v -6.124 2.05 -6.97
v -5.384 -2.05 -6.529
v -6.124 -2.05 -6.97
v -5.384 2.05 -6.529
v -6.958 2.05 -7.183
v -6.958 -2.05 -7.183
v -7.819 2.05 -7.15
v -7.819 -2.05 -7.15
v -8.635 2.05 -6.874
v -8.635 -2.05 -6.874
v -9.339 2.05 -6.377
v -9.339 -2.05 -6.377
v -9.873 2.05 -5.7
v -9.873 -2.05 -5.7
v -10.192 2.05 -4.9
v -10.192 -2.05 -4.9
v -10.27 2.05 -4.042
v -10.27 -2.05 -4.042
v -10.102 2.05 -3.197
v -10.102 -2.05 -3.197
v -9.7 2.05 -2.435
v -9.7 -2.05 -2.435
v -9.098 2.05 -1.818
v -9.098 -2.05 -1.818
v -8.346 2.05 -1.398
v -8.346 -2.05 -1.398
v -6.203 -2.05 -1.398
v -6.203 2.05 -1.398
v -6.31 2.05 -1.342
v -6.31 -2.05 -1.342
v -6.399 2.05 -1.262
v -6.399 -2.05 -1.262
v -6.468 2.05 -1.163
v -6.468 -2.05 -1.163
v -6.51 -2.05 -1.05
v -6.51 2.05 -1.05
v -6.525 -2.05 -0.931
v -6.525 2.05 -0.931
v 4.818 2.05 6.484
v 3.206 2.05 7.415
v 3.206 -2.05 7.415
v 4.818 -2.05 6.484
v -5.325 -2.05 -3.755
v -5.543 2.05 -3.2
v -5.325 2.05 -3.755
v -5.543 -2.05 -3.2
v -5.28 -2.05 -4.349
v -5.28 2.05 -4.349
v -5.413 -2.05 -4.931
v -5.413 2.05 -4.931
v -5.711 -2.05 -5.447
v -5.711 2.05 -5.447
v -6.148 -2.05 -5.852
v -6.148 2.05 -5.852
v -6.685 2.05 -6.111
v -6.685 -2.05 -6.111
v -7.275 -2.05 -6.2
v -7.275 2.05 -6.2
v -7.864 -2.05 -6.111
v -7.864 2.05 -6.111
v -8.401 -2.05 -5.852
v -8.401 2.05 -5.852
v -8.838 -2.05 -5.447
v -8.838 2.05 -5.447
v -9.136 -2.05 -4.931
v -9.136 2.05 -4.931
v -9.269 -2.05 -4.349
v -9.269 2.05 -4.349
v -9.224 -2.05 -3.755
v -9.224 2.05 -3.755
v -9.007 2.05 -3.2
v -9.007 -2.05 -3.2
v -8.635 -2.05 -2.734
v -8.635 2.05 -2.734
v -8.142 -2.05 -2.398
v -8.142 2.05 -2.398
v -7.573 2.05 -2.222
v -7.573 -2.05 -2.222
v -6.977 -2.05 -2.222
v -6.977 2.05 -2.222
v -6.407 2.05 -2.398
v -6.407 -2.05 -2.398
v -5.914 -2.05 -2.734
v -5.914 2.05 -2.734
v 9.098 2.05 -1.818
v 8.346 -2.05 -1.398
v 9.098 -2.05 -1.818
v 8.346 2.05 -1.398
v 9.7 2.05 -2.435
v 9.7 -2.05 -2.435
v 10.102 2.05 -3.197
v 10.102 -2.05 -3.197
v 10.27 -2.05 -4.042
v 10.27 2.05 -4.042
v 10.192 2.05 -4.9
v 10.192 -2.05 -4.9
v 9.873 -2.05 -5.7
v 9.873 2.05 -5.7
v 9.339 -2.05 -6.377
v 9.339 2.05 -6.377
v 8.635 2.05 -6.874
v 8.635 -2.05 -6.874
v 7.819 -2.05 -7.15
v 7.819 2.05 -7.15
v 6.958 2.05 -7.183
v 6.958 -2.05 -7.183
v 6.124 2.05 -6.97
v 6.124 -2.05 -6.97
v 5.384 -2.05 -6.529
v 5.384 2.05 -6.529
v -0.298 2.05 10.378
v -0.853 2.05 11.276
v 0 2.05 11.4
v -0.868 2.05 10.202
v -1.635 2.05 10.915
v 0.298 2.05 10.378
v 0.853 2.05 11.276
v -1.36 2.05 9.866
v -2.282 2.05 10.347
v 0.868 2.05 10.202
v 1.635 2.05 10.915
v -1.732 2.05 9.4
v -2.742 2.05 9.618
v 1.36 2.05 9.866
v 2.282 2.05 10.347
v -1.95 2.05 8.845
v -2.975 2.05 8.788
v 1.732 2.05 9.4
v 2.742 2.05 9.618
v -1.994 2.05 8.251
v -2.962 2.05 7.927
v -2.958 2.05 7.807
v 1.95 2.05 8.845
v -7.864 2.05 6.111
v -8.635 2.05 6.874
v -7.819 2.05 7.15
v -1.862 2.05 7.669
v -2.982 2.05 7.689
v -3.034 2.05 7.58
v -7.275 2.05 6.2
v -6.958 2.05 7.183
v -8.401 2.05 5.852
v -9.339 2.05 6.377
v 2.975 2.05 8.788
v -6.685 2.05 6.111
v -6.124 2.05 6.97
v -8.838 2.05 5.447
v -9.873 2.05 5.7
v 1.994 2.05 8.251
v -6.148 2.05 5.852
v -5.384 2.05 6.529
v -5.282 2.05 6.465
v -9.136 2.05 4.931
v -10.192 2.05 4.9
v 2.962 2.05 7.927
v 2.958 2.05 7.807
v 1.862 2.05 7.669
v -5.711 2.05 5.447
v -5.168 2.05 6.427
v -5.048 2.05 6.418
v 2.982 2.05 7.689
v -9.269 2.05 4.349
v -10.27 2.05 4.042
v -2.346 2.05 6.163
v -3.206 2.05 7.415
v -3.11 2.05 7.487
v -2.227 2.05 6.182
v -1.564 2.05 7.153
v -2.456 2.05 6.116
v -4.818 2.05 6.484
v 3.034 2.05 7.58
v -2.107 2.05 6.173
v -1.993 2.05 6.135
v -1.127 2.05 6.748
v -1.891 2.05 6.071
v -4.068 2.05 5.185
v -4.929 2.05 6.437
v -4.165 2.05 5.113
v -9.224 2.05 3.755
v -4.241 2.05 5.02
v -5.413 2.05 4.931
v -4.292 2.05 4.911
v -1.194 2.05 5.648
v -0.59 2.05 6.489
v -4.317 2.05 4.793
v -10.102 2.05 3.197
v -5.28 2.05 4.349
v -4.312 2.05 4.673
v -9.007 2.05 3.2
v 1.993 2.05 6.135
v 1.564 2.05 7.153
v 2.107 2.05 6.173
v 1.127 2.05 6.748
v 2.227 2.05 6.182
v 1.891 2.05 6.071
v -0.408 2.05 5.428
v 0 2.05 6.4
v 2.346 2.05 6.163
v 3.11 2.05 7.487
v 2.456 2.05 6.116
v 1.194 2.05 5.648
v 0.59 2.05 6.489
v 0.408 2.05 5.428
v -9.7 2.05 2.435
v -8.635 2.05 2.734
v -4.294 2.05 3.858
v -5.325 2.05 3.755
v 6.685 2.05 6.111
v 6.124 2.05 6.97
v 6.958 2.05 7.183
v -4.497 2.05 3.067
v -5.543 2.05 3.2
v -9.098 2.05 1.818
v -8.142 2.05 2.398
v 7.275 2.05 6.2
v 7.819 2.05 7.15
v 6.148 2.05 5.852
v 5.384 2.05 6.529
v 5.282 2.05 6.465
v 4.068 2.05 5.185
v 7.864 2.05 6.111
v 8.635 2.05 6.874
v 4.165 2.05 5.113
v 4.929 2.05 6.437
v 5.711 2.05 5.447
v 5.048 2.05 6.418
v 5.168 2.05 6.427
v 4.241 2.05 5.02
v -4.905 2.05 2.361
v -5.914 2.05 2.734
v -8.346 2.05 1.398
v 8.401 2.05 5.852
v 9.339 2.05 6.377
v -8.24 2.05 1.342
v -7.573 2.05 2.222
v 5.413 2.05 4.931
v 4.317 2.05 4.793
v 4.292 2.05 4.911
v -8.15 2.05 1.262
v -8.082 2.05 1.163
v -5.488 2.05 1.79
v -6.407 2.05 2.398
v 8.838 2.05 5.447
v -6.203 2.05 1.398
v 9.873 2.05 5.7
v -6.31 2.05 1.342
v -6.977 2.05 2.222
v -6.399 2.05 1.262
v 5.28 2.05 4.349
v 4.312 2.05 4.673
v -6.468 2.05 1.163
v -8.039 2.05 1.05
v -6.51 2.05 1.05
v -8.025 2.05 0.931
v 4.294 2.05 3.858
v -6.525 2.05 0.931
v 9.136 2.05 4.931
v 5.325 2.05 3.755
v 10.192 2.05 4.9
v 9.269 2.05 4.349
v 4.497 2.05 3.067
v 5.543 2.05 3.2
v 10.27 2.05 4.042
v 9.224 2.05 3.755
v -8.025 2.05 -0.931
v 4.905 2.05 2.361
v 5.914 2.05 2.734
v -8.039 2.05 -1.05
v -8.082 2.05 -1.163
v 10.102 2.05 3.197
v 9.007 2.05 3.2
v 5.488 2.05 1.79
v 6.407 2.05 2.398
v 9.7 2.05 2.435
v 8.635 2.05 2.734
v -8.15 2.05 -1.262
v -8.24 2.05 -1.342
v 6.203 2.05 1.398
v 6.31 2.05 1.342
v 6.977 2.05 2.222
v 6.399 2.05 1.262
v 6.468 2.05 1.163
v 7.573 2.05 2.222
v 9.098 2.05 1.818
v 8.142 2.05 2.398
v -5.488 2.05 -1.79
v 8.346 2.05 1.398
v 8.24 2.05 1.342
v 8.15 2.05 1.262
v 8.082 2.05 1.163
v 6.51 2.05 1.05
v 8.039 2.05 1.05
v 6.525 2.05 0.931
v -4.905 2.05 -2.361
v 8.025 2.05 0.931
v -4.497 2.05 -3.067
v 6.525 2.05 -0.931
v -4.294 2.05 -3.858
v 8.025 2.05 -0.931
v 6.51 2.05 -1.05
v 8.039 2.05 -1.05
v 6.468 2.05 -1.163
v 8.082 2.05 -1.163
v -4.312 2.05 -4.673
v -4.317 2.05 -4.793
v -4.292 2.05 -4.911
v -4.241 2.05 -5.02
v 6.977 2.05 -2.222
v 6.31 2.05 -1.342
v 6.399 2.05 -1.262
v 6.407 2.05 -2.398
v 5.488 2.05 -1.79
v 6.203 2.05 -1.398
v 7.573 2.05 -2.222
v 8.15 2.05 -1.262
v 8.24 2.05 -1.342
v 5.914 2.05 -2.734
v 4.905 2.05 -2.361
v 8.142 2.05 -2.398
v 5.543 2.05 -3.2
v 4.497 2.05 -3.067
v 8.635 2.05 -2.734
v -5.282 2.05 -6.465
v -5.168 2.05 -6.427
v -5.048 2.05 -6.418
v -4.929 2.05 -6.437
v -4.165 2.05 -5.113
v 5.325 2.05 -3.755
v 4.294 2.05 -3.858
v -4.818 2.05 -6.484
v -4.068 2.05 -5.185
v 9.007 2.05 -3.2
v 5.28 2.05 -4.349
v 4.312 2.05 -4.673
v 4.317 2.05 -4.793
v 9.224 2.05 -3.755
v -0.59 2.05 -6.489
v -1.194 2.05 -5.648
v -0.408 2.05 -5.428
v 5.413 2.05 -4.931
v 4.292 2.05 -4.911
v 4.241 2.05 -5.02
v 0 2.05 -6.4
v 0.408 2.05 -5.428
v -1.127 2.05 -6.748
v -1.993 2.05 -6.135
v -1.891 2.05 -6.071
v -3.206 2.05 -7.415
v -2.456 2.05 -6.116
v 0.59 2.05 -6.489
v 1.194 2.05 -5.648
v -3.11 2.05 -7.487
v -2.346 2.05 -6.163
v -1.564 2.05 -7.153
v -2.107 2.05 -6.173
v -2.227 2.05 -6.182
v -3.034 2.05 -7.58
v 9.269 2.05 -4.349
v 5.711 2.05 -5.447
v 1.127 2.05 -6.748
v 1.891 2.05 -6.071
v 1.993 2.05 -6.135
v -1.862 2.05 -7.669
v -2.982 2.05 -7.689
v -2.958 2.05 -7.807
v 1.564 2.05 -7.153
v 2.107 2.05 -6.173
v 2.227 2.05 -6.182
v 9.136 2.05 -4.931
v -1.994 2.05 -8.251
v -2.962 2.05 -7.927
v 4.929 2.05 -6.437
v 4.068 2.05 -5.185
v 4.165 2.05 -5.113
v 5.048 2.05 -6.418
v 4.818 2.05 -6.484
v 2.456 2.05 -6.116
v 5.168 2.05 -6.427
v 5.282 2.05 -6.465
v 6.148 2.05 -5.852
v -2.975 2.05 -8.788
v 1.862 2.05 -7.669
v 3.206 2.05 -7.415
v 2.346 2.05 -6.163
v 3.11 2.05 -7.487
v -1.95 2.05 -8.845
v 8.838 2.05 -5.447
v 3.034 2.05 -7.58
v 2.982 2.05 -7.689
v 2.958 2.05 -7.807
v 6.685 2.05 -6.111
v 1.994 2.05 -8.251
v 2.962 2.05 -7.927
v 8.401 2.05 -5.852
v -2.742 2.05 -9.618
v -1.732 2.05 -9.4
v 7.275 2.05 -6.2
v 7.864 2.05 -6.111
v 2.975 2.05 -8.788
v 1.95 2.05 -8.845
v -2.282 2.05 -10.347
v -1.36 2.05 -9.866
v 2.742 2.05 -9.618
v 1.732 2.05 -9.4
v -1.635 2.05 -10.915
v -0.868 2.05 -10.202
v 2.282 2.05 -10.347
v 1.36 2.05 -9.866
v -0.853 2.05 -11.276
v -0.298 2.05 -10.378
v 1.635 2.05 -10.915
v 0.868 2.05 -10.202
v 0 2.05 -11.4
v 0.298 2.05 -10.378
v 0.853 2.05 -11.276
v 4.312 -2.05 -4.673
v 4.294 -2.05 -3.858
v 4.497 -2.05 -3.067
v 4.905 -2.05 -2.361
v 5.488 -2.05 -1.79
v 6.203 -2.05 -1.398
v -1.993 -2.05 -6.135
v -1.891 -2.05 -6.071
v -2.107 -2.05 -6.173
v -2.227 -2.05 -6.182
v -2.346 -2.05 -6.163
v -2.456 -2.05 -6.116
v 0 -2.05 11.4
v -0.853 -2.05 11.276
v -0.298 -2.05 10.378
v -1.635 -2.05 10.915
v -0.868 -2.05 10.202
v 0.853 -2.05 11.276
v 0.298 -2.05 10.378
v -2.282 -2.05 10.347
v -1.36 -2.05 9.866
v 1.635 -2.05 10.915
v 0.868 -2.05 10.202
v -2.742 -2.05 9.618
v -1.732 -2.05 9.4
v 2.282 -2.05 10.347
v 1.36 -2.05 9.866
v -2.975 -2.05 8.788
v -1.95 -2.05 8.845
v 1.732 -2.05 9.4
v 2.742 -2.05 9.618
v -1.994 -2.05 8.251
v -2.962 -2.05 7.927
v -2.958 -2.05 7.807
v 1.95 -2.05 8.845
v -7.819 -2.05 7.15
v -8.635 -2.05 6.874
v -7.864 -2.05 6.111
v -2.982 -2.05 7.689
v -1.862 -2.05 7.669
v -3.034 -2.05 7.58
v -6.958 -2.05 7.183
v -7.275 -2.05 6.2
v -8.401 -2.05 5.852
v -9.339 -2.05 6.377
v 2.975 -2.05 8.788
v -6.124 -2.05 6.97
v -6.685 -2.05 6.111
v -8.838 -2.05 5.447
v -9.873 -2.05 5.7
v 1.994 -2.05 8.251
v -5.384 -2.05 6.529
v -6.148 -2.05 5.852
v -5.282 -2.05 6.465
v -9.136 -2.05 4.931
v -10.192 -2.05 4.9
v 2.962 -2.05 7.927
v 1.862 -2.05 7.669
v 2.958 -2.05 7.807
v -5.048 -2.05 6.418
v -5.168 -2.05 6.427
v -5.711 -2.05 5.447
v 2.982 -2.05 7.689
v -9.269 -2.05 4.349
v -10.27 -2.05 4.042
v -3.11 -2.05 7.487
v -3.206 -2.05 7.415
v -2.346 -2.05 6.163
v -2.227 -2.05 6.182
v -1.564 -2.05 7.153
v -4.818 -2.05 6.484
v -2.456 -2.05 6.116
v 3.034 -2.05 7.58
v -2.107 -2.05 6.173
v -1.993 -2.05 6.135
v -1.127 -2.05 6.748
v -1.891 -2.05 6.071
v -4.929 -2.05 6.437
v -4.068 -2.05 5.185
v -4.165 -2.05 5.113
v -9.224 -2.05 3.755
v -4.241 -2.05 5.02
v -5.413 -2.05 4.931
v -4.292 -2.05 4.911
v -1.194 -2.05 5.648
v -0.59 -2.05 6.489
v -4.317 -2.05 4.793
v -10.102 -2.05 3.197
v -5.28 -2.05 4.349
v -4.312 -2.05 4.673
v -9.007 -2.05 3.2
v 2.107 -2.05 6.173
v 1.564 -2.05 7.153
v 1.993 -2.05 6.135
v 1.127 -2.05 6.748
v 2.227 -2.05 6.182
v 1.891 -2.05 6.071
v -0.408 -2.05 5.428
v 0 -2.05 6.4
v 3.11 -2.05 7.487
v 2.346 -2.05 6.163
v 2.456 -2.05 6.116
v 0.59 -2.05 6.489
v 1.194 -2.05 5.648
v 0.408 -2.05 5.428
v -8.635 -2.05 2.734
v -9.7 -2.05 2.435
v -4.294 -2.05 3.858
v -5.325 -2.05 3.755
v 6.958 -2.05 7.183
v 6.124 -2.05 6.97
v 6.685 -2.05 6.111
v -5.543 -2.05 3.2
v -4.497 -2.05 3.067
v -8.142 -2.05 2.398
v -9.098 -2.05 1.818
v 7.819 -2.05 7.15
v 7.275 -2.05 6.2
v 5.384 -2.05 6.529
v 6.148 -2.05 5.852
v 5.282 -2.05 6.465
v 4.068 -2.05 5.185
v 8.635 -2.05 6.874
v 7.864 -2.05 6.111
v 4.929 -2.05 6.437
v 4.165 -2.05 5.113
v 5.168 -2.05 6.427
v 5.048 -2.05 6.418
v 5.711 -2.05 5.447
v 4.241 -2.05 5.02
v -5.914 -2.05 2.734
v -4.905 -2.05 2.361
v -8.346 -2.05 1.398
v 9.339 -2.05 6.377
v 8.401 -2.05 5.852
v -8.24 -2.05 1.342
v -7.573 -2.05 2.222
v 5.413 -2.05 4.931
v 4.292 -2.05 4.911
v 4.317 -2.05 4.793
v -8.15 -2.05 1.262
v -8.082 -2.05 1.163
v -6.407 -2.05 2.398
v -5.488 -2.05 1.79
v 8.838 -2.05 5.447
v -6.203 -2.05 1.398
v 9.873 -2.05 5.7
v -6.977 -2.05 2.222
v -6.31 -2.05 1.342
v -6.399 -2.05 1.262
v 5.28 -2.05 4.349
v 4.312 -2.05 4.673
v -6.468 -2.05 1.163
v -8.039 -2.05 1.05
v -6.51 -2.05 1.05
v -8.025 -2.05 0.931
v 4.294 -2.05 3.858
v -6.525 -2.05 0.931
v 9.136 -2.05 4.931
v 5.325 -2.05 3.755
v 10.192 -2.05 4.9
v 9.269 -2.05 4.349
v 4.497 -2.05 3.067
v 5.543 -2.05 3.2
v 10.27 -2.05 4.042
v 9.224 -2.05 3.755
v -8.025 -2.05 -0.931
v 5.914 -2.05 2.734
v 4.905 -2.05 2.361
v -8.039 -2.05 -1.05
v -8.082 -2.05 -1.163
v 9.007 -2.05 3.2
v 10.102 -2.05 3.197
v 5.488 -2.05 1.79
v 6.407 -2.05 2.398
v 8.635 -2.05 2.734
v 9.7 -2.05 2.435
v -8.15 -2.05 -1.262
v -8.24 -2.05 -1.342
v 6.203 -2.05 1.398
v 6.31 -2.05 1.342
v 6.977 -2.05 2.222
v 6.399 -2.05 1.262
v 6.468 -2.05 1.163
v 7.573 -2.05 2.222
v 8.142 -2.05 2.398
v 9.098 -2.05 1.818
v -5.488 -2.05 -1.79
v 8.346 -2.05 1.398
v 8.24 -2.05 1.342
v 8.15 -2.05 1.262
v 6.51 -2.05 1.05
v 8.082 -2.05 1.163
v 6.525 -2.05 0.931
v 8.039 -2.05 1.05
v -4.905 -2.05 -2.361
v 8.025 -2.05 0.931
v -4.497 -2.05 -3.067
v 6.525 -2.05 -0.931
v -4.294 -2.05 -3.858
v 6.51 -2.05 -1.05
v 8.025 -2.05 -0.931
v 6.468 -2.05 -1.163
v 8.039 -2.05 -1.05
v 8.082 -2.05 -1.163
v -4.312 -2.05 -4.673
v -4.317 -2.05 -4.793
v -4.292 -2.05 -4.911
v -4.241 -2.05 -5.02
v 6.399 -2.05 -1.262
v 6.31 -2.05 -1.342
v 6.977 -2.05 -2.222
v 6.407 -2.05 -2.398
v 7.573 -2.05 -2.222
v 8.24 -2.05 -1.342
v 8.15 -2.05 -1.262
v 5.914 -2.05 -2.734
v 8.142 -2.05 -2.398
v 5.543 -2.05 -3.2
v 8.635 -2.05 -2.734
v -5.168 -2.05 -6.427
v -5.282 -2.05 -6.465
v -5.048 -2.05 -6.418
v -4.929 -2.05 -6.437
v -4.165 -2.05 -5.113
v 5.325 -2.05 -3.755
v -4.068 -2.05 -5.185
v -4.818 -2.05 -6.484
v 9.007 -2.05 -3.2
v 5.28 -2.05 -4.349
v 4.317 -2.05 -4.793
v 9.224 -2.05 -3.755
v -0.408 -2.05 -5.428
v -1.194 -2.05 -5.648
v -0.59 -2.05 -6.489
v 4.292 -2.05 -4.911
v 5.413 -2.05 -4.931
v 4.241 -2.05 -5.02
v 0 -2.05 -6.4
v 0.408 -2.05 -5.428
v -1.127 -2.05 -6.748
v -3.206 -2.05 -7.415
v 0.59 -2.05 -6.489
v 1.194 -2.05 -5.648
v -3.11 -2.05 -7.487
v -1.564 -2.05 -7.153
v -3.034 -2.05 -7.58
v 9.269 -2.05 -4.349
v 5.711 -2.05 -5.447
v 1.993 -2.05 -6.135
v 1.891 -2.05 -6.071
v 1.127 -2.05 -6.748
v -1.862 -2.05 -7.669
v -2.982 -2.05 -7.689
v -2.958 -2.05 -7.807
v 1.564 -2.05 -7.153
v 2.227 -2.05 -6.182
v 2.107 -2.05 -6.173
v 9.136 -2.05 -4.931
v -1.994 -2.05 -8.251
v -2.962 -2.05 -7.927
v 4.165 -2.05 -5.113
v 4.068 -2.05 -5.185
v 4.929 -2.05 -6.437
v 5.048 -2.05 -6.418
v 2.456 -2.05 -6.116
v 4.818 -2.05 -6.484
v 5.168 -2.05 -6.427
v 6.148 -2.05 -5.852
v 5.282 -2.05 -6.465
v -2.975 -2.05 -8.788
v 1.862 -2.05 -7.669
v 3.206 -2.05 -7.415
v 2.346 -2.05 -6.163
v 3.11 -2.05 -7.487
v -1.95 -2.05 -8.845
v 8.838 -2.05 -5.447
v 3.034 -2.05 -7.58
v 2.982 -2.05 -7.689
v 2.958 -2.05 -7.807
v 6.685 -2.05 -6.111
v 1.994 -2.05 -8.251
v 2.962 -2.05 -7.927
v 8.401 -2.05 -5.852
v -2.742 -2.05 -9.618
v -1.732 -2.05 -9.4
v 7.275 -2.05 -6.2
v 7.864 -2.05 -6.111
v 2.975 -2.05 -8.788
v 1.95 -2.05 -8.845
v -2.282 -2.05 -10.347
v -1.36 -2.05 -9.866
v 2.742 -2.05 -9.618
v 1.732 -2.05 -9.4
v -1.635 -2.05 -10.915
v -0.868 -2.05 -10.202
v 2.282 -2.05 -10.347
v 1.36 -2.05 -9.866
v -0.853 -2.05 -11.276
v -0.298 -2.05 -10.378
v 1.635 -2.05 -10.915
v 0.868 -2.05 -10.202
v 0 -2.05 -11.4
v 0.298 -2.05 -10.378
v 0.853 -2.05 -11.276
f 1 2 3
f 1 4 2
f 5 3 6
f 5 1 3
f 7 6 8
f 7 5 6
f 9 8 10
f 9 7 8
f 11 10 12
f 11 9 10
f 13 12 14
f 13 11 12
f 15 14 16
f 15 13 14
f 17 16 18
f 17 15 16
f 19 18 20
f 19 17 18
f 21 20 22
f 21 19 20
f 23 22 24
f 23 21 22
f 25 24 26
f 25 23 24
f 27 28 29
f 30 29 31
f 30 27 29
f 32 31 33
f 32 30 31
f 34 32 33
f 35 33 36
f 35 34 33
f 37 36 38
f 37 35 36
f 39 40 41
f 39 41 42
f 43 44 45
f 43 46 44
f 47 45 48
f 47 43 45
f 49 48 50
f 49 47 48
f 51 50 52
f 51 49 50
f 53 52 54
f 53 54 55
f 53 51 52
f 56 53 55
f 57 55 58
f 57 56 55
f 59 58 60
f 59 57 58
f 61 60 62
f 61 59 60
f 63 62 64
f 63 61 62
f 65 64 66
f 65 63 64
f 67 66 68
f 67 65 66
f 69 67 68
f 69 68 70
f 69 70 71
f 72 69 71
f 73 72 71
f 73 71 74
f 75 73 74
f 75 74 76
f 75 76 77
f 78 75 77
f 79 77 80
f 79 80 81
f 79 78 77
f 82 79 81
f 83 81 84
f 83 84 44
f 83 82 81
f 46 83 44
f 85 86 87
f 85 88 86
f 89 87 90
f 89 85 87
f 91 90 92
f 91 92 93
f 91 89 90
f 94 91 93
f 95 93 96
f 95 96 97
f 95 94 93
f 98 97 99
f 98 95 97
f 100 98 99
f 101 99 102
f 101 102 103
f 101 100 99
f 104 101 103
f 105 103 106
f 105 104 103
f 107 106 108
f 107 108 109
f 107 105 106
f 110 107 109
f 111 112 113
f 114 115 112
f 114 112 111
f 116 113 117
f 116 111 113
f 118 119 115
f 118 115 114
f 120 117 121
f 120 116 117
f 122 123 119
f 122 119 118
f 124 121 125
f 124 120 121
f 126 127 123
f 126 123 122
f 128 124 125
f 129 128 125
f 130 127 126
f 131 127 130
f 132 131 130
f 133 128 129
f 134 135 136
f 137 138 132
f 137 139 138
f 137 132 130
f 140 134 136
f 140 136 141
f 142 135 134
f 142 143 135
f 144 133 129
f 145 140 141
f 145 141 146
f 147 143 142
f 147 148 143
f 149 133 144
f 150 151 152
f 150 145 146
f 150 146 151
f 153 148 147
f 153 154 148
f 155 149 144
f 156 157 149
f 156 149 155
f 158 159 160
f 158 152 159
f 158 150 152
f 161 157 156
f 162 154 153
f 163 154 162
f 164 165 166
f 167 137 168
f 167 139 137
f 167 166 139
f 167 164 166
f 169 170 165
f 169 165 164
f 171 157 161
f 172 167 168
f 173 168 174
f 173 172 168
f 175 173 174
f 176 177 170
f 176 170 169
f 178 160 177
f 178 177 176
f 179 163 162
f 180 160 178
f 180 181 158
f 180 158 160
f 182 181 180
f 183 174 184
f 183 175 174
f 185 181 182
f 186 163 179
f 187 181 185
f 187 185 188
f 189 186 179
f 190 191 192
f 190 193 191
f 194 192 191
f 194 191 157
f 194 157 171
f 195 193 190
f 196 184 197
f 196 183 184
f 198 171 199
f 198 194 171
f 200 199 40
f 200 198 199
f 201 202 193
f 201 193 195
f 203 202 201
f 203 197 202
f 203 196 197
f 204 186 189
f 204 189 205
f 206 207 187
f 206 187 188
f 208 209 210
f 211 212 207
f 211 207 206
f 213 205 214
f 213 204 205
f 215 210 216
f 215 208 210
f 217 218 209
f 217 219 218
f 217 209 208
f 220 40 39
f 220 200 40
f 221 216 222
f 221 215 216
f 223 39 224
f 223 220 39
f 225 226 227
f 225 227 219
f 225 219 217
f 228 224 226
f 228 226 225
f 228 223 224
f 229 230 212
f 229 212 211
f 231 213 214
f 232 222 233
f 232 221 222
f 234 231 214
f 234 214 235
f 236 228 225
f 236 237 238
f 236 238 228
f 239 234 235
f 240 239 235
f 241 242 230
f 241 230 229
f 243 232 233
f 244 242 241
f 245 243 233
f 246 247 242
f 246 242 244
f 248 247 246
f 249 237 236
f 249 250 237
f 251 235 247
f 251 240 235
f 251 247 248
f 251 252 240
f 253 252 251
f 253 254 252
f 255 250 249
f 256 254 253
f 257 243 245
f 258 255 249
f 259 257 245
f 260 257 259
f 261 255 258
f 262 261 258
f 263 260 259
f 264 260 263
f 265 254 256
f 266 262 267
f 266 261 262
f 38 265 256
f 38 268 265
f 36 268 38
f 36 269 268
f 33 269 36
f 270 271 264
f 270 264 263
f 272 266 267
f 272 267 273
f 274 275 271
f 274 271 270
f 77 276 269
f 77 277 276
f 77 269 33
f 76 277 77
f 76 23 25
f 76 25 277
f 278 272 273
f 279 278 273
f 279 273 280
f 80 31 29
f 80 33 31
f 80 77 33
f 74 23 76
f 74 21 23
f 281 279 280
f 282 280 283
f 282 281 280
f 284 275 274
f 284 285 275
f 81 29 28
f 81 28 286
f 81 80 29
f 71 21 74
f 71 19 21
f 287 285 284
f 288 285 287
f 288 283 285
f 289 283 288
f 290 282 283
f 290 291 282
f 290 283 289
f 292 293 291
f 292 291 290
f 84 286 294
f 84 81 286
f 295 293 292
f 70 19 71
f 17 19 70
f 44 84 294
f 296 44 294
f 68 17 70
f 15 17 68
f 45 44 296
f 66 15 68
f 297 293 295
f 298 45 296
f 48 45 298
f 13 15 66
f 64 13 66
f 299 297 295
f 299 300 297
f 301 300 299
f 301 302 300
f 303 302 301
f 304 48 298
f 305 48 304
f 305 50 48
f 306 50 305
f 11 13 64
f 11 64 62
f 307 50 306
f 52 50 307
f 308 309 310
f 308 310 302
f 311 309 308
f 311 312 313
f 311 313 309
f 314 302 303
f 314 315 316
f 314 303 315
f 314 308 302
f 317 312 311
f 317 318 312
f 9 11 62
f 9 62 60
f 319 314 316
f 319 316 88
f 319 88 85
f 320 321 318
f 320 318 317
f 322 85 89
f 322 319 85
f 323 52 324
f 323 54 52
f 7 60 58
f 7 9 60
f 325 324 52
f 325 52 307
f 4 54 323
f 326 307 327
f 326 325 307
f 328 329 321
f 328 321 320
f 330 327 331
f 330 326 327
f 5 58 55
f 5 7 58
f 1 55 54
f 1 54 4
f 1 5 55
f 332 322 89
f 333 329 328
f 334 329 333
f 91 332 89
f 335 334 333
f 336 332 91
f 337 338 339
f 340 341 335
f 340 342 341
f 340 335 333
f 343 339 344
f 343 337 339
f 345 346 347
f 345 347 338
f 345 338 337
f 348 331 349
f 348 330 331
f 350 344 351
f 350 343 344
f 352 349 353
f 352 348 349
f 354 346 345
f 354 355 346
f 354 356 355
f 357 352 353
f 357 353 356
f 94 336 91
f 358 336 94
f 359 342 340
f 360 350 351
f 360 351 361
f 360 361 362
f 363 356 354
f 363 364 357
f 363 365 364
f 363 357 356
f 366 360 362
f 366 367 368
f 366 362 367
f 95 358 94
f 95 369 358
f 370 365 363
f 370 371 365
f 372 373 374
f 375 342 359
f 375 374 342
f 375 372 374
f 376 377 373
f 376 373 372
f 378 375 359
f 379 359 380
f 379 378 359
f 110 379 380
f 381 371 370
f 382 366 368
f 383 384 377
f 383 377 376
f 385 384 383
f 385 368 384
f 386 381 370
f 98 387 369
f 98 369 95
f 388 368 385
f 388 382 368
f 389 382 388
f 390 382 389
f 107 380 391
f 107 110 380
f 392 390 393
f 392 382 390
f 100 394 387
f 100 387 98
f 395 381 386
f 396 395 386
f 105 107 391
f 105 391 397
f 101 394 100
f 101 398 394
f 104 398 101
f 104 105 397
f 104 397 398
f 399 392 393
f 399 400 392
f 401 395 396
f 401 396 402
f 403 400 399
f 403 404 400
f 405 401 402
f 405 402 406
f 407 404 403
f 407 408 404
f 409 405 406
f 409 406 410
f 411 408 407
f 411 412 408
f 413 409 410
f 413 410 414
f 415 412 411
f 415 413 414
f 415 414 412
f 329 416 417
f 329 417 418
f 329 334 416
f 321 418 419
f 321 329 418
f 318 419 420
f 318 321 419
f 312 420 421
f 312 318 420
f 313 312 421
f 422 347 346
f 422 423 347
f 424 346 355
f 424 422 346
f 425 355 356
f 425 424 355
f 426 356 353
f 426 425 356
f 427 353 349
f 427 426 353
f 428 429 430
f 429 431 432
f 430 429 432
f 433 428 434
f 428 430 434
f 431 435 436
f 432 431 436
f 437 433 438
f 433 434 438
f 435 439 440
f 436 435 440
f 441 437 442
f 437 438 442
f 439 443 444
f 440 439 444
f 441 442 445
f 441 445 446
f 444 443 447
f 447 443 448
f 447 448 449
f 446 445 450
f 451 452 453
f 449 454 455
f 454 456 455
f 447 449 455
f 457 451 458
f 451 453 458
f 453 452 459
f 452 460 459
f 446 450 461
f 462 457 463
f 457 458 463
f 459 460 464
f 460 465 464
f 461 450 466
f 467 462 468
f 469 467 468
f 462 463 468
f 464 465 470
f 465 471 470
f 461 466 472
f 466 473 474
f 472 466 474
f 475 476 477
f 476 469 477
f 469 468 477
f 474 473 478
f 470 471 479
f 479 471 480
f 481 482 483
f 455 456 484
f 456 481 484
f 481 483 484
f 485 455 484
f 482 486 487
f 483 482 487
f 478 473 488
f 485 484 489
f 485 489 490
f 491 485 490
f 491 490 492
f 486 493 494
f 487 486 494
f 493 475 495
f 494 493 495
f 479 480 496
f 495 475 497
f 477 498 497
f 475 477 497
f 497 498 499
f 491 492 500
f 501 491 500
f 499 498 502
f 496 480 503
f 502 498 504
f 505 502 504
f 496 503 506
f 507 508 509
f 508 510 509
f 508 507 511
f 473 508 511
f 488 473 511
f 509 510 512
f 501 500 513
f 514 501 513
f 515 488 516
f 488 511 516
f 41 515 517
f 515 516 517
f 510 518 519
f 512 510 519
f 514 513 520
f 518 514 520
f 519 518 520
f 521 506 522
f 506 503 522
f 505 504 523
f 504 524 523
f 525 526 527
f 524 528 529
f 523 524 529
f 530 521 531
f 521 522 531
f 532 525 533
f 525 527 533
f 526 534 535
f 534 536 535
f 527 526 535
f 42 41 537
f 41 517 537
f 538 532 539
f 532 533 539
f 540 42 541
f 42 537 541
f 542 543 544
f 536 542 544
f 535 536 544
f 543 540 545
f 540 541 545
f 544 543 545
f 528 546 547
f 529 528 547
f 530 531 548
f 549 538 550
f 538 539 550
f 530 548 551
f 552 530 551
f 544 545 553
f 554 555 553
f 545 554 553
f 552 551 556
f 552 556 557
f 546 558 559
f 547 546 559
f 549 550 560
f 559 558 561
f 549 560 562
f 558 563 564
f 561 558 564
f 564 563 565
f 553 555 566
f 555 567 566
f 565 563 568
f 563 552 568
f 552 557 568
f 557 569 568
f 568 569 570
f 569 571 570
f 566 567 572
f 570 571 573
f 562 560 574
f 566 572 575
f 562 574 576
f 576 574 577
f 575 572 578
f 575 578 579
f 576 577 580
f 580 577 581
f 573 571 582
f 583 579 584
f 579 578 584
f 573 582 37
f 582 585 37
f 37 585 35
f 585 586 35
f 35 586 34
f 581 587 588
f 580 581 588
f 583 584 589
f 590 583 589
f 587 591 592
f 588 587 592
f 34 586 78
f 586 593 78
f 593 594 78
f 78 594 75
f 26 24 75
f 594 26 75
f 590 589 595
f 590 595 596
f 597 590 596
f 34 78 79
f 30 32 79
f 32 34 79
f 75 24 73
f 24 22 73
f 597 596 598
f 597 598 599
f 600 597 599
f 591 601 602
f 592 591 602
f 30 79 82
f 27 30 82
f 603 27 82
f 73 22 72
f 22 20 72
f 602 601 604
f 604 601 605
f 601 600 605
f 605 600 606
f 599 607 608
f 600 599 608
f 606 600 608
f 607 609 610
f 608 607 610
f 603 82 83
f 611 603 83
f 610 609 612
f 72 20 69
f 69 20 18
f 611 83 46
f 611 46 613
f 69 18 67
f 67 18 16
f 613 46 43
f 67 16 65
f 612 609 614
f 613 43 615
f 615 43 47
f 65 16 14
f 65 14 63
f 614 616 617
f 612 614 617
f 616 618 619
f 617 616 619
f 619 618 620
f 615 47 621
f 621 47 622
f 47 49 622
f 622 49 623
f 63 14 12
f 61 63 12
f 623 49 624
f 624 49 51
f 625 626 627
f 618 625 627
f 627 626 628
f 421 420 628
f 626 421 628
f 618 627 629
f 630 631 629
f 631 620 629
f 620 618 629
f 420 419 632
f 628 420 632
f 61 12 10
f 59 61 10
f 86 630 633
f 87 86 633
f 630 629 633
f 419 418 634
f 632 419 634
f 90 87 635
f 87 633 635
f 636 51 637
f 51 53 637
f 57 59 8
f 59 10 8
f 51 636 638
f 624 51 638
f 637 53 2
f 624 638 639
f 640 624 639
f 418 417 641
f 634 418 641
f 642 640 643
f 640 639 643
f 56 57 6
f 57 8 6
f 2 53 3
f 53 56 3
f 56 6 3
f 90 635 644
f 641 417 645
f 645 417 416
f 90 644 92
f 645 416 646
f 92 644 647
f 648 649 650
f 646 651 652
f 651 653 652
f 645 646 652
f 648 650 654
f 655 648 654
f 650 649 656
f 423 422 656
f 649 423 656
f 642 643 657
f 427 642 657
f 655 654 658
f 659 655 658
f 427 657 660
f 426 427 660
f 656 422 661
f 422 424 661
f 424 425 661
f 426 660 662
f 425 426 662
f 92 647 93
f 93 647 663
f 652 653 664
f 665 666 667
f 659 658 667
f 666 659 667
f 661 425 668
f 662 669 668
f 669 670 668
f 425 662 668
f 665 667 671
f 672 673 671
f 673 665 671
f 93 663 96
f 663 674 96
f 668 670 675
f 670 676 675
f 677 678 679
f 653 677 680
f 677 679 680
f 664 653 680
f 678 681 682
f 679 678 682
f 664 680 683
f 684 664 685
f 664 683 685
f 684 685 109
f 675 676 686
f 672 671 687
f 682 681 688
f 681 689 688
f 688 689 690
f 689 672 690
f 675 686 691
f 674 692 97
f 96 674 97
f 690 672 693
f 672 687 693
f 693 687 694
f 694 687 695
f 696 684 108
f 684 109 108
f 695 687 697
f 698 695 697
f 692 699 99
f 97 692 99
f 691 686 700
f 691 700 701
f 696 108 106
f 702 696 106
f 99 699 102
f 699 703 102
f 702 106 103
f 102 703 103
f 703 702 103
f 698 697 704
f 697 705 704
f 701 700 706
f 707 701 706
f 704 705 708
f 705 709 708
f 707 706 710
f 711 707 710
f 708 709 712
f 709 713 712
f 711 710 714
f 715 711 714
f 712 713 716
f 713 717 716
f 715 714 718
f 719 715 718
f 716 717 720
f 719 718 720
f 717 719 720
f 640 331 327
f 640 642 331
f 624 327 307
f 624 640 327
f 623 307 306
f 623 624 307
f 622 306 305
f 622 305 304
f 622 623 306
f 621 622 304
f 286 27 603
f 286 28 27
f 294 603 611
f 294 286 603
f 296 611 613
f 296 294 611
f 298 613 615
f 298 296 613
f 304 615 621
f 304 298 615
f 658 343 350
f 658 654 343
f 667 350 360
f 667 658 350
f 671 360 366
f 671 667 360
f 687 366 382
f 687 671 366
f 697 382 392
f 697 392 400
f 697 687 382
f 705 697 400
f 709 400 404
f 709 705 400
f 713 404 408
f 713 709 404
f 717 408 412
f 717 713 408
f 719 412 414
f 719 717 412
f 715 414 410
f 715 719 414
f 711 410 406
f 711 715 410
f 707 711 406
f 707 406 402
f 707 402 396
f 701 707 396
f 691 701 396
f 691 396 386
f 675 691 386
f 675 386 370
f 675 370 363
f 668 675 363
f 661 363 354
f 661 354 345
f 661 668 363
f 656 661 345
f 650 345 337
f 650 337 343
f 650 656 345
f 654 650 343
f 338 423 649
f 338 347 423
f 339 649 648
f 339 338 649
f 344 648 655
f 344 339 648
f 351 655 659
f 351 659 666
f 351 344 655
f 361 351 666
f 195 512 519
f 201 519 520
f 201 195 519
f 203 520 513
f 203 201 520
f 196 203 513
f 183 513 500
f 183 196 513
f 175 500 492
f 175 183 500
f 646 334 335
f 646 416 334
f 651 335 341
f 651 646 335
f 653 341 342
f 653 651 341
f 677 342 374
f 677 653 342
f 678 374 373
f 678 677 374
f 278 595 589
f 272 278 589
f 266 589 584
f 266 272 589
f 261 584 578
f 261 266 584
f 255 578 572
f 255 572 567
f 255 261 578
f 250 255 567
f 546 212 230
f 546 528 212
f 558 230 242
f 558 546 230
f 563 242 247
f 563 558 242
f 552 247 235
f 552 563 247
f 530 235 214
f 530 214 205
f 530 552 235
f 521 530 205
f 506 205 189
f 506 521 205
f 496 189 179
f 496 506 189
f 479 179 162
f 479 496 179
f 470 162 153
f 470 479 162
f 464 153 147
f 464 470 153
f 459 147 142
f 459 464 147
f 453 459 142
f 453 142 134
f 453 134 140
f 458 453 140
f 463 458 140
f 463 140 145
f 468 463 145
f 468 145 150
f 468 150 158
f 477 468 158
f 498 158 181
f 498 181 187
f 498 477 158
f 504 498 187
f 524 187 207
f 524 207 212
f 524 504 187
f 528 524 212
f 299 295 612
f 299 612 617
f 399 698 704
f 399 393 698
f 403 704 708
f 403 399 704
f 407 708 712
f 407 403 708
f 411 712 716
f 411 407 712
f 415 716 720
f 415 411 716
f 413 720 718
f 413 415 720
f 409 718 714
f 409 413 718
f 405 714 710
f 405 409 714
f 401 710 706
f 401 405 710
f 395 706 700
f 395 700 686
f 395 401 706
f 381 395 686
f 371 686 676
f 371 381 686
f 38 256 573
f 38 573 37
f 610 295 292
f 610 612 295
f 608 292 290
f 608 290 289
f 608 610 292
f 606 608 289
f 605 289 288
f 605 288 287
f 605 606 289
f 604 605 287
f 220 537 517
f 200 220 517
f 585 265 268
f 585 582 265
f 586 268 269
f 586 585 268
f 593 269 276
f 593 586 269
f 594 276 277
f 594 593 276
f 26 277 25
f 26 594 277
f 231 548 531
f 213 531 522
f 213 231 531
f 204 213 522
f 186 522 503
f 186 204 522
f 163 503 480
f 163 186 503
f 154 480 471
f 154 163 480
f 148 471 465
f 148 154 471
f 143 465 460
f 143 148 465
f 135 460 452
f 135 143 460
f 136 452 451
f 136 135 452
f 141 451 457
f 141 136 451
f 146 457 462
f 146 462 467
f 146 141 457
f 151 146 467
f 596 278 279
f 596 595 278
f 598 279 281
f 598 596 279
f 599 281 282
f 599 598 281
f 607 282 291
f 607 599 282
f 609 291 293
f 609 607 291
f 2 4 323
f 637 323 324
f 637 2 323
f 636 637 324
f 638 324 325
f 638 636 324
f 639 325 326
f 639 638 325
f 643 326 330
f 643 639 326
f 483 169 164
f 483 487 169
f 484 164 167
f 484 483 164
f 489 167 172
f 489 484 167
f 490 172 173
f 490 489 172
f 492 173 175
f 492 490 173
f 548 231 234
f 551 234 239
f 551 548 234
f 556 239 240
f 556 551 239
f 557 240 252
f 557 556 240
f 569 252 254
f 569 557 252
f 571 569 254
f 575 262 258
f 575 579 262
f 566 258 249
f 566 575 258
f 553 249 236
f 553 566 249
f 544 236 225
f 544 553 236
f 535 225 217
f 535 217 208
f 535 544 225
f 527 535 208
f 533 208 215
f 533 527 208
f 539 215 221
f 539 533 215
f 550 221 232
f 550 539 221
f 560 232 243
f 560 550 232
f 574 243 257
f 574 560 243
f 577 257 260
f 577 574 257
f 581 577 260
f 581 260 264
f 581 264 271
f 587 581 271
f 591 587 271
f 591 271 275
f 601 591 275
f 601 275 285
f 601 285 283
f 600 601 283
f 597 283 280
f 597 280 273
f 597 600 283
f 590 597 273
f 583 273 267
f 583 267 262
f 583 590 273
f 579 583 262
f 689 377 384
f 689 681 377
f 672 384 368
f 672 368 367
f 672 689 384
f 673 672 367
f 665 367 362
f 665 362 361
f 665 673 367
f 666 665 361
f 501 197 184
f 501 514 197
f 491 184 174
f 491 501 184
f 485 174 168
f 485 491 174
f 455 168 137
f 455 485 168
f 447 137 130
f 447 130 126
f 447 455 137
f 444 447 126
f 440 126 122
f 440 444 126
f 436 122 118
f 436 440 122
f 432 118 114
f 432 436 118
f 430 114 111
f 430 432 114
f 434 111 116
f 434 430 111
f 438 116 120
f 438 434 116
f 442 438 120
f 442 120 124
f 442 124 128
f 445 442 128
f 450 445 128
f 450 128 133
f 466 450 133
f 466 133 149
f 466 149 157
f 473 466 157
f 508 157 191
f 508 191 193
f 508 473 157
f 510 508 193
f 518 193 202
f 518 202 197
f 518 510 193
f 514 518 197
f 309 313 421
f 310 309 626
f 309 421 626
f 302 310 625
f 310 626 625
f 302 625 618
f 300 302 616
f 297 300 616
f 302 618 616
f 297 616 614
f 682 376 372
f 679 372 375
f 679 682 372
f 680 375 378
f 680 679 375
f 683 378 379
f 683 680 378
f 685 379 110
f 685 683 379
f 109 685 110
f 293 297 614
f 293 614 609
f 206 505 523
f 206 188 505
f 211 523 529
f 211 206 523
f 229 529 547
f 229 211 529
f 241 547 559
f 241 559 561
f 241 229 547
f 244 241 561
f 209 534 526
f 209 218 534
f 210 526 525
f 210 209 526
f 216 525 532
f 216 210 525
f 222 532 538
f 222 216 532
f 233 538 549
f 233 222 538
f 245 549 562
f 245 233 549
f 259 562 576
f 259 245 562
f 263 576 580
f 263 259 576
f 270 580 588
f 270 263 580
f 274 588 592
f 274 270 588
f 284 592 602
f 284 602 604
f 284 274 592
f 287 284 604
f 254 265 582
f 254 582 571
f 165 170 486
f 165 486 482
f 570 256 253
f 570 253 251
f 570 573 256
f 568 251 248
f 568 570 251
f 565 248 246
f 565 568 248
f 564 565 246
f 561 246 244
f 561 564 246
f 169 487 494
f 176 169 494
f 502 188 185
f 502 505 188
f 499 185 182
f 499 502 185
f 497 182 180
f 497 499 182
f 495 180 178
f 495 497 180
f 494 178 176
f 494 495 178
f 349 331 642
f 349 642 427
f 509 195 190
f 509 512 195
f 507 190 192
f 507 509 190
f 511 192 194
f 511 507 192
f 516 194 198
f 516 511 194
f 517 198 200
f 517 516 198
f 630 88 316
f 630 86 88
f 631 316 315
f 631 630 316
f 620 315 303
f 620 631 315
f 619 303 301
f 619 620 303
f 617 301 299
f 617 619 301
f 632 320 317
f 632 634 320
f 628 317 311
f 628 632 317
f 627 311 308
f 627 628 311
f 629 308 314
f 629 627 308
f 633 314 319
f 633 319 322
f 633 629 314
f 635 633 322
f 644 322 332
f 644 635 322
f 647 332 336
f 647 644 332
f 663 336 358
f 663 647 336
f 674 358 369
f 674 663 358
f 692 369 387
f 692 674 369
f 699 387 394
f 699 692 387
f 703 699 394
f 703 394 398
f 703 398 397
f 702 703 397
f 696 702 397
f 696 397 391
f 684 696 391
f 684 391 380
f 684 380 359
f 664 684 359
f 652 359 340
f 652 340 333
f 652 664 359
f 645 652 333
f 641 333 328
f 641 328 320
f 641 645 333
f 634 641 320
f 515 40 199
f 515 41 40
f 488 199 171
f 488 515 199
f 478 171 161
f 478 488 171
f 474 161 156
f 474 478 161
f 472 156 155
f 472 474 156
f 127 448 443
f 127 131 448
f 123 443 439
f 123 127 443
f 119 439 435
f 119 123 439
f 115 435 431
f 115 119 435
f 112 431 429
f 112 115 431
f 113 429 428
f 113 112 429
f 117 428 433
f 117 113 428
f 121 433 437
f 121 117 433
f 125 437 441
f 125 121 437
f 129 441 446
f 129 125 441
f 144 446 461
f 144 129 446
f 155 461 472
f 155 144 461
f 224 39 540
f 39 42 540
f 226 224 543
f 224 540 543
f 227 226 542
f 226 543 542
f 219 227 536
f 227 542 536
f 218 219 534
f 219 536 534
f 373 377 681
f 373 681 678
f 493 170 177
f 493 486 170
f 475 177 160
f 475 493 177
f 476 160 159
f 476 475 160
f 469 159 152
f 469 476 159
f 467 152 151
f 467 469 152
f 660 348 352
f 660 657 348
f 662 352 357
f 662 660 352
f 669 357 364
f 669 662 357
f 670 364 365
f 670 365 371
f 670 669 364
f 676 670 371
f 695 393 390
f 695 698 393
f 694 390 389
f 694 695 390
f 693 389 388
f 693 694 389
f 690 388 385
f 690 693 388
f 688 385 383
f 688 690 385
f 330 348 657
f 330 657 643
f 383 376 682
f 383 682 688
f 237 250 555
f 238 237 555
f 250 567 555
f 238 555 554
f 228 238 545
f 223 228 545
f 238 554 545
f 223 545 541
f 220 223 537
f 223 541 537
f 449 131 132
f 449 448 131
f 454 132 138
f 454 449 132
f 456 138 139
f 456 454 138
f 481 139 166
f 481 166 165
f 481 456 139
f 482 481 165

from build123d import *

# Parameters (mm, degrees)
SKETCH1_R           = 3
SKETCH1_R_2         = 2
BOSS_EXTRUDE1_DEPTH = 2.05
CIRPATTERN7_COUNT   = 6
BOSS_EXTRUDE4_DEPTH = 4.1
CIRPATTERN8_COUNT   = 6
FILLET3_R           = 0.5


with BuildPart() as part:
    # Sketch1 → Boss-Extrude1 (new, symmetric)
    with BuildSketch(Plane(origin=(0, 0, 0), x_dir=(1, 0, 0), z_dir=(0, 1, 0))):
        with Locations(Location((0, 8.4, 0), (0, 0, 270))):
            Circle(SKETCH1_R)
        with Locations(Location((0, 8.4, 0), (0, 0, 270))):
            Circle(SKETCH1_R_2, mode=Mode.SUBTRACT)
    extrude(amount=BOSS_EXTRUDE1_DEPTH, both=True)


with BuildPart() as cirpattern7_1:
    # CirPattern7: pattern copy
    add(part.part.rotate(Axis((0, 0, 0), (0, 1, 0)), 1 * 360 / CIRPATTERN7_COUNT))


with BuildPart() as cirpattern7_2:
    # CirPattern7: pattern copy
    add(part.part.rotate(Axis((0, 0, 0), (0, 1, 0)), 2 * 360 / CIRPATTERN7_COUNT))


with BuildPart() as cirpattern7_3:
    # CirPattern7: pattern copy
    add(part.part.rotate(Axis((0, 0, 0), (0, 1, 0)), 3 * 360 / CIRPATTERN7_COUNT))


with BuildPart() as cirpattern7_4:
    # CirPattern7: pattern copy
    add(part.part.rotate(Axis((0, 0, 0), (0, 1, 0)), 4 * 360 / CIRPATTERN7_COUNT))


with BuildPart() as cirpattern7_5:
    # CirPattern7: pattern copy
    add(part.part.rotate(Axis((0, 0, 0), (0, 1, 0)), 5 * 360 / CIRPATTERN7_COUNT))


with BuildPart() as part_1:
    add(part.part)

    # Sketch5 → Boss-Extrude4 (add)
    with BuildSketch(Plane(origin=(0, 2.05, 0), x_dir=(1, 0, 0), z_dir=(0, 1, 0))):
        with BuildLine():
            Line((-4.384036917, 5.002849702), (-2.140576475, 6.298112192))
            ThreePointArc((-2.140576475, 6.298112192), (-2.598076211, 6.9), (-2.890576475, 7.597150298))
            Line((-2.890576475, 7.597150298), (-5.134036917, 6.301887808))
            ThreePointArc((-5.134036917, 6.301887808), (-4.67653718, 5.7), (-4.384036917, 5.002849702))
        make_face()
    extrude(amount=-BOSS_EXTRUDE4_DEPTH)


with BuildPart() as cirpattern8_1:
    # CirPattern8: pattern copy
    add(part_1.part.rotate(Axis((0, 0, 0), (0, 1, 0)), 1 * 360 / CIRPATTERN8_COUNT))


with BuildPart() as cirpattern8_2:
    # CirPattern8: pattern copy
    add(part_1.part.rotate(Axis((0, 0, 0), (0, 1, 0)), 2 * 360 / CIRPATTERN8_COUNT))


with BuildPart() as cirpattern8_3:
    # CirPattern8: pattern copy
    add(part_1.part.rotate(Axis((0, 0, 0), (0, 1, 0)), 3 * 360 / CIRPATTERN8_COUNT))


with BuildPart() as cirpattern8_4:
    # CirPattern8: pattern copy
    add(part_1.part.rotate(Axis((0, 0, 0), (0, 1, 0)), 4 * 360 / CIRPATTERN8_COUNT))


with BuildPart() as cirpattern8_5:
    # CirPattern8: pattern copy
    add(part_1.part.rotate(Axis((0, 0, 0), (0, 1, 0)), 5 * 360 / CIRPATTERN8_COUNT))


with BuildPart() as cirpattern8_4_1:
    add(cirpattern8_4.part)

    # Combine1: read off the stored shape, not the designer's step
    # Combine1: union CirPattern7_5, CirPattern7_3, CirPattern7_2, CirPattern7_1, part, CirPattern8_5, CirPattern8_3, CirPattern8_2, CirPattern8_1, CirPattern7_4
    add(cirpattern7_5.part)
    add(cirpattern7_3.part)
    add(cirpattern7_2.part)
    add(cirpattern7_1.part)
    add(part_1.part)
    add(cirpattern8_5.part)
    add(cirpattern8_3.part)
    add(cirpattern8_2.part)
    add(cirpattern8_1.part)
    add(cirpattern7_4.part)

    # Fillet3
    fillet3_edges = [cirpattern8_4_1.edges().sort_by_distance(p)[0] for p in [
        (-8.024613392, 0, -1.29526249),
        (-4.384036917, 0, -5.002849702),
        (-8.024613392, 0, 1.29526249),
        (-6.524613392, 0, -1.29526249),
        (-6.524613392, 0, 1.29526249),
        (-5.134036917, 0, 6.301887808),
        (-2.890576475, 0, 7.597150298),
        (-4.384036917, 0, 5.002849702),
        (-2.140576475, 0, 6.298112192),
        (2.890576475, 0, 7.597150298),
        (5.134036917, 0, 6.301887808),
        (2.140576475, 0, 6.298112192),
        (4.384036917, 0, 5.002849702),
        (8.024613392, 0, 1.29526249),
        (8.024613392, 0, -1.29526249),
        (6.524613392, 0, 1.29526249),
        (6.524613392, 0, -1.29526249),
        (5.134036917, 0, -6.301887808),
        (2.890576475, 0, -7.597150298),
        (4.384036917, 0, -5.002849702),
        (2.140576475, 0, -6.298112192),
        (-2.890576475, 0, -7.597150298),
        (-5.134036917, 0, -6.301887808),
        (-2.140576475, 0, -6.298112192),
    ]]
    fillet(fillet3_edges, radius=FILLET3_R)


solid = cirpattern8_4_1.part
